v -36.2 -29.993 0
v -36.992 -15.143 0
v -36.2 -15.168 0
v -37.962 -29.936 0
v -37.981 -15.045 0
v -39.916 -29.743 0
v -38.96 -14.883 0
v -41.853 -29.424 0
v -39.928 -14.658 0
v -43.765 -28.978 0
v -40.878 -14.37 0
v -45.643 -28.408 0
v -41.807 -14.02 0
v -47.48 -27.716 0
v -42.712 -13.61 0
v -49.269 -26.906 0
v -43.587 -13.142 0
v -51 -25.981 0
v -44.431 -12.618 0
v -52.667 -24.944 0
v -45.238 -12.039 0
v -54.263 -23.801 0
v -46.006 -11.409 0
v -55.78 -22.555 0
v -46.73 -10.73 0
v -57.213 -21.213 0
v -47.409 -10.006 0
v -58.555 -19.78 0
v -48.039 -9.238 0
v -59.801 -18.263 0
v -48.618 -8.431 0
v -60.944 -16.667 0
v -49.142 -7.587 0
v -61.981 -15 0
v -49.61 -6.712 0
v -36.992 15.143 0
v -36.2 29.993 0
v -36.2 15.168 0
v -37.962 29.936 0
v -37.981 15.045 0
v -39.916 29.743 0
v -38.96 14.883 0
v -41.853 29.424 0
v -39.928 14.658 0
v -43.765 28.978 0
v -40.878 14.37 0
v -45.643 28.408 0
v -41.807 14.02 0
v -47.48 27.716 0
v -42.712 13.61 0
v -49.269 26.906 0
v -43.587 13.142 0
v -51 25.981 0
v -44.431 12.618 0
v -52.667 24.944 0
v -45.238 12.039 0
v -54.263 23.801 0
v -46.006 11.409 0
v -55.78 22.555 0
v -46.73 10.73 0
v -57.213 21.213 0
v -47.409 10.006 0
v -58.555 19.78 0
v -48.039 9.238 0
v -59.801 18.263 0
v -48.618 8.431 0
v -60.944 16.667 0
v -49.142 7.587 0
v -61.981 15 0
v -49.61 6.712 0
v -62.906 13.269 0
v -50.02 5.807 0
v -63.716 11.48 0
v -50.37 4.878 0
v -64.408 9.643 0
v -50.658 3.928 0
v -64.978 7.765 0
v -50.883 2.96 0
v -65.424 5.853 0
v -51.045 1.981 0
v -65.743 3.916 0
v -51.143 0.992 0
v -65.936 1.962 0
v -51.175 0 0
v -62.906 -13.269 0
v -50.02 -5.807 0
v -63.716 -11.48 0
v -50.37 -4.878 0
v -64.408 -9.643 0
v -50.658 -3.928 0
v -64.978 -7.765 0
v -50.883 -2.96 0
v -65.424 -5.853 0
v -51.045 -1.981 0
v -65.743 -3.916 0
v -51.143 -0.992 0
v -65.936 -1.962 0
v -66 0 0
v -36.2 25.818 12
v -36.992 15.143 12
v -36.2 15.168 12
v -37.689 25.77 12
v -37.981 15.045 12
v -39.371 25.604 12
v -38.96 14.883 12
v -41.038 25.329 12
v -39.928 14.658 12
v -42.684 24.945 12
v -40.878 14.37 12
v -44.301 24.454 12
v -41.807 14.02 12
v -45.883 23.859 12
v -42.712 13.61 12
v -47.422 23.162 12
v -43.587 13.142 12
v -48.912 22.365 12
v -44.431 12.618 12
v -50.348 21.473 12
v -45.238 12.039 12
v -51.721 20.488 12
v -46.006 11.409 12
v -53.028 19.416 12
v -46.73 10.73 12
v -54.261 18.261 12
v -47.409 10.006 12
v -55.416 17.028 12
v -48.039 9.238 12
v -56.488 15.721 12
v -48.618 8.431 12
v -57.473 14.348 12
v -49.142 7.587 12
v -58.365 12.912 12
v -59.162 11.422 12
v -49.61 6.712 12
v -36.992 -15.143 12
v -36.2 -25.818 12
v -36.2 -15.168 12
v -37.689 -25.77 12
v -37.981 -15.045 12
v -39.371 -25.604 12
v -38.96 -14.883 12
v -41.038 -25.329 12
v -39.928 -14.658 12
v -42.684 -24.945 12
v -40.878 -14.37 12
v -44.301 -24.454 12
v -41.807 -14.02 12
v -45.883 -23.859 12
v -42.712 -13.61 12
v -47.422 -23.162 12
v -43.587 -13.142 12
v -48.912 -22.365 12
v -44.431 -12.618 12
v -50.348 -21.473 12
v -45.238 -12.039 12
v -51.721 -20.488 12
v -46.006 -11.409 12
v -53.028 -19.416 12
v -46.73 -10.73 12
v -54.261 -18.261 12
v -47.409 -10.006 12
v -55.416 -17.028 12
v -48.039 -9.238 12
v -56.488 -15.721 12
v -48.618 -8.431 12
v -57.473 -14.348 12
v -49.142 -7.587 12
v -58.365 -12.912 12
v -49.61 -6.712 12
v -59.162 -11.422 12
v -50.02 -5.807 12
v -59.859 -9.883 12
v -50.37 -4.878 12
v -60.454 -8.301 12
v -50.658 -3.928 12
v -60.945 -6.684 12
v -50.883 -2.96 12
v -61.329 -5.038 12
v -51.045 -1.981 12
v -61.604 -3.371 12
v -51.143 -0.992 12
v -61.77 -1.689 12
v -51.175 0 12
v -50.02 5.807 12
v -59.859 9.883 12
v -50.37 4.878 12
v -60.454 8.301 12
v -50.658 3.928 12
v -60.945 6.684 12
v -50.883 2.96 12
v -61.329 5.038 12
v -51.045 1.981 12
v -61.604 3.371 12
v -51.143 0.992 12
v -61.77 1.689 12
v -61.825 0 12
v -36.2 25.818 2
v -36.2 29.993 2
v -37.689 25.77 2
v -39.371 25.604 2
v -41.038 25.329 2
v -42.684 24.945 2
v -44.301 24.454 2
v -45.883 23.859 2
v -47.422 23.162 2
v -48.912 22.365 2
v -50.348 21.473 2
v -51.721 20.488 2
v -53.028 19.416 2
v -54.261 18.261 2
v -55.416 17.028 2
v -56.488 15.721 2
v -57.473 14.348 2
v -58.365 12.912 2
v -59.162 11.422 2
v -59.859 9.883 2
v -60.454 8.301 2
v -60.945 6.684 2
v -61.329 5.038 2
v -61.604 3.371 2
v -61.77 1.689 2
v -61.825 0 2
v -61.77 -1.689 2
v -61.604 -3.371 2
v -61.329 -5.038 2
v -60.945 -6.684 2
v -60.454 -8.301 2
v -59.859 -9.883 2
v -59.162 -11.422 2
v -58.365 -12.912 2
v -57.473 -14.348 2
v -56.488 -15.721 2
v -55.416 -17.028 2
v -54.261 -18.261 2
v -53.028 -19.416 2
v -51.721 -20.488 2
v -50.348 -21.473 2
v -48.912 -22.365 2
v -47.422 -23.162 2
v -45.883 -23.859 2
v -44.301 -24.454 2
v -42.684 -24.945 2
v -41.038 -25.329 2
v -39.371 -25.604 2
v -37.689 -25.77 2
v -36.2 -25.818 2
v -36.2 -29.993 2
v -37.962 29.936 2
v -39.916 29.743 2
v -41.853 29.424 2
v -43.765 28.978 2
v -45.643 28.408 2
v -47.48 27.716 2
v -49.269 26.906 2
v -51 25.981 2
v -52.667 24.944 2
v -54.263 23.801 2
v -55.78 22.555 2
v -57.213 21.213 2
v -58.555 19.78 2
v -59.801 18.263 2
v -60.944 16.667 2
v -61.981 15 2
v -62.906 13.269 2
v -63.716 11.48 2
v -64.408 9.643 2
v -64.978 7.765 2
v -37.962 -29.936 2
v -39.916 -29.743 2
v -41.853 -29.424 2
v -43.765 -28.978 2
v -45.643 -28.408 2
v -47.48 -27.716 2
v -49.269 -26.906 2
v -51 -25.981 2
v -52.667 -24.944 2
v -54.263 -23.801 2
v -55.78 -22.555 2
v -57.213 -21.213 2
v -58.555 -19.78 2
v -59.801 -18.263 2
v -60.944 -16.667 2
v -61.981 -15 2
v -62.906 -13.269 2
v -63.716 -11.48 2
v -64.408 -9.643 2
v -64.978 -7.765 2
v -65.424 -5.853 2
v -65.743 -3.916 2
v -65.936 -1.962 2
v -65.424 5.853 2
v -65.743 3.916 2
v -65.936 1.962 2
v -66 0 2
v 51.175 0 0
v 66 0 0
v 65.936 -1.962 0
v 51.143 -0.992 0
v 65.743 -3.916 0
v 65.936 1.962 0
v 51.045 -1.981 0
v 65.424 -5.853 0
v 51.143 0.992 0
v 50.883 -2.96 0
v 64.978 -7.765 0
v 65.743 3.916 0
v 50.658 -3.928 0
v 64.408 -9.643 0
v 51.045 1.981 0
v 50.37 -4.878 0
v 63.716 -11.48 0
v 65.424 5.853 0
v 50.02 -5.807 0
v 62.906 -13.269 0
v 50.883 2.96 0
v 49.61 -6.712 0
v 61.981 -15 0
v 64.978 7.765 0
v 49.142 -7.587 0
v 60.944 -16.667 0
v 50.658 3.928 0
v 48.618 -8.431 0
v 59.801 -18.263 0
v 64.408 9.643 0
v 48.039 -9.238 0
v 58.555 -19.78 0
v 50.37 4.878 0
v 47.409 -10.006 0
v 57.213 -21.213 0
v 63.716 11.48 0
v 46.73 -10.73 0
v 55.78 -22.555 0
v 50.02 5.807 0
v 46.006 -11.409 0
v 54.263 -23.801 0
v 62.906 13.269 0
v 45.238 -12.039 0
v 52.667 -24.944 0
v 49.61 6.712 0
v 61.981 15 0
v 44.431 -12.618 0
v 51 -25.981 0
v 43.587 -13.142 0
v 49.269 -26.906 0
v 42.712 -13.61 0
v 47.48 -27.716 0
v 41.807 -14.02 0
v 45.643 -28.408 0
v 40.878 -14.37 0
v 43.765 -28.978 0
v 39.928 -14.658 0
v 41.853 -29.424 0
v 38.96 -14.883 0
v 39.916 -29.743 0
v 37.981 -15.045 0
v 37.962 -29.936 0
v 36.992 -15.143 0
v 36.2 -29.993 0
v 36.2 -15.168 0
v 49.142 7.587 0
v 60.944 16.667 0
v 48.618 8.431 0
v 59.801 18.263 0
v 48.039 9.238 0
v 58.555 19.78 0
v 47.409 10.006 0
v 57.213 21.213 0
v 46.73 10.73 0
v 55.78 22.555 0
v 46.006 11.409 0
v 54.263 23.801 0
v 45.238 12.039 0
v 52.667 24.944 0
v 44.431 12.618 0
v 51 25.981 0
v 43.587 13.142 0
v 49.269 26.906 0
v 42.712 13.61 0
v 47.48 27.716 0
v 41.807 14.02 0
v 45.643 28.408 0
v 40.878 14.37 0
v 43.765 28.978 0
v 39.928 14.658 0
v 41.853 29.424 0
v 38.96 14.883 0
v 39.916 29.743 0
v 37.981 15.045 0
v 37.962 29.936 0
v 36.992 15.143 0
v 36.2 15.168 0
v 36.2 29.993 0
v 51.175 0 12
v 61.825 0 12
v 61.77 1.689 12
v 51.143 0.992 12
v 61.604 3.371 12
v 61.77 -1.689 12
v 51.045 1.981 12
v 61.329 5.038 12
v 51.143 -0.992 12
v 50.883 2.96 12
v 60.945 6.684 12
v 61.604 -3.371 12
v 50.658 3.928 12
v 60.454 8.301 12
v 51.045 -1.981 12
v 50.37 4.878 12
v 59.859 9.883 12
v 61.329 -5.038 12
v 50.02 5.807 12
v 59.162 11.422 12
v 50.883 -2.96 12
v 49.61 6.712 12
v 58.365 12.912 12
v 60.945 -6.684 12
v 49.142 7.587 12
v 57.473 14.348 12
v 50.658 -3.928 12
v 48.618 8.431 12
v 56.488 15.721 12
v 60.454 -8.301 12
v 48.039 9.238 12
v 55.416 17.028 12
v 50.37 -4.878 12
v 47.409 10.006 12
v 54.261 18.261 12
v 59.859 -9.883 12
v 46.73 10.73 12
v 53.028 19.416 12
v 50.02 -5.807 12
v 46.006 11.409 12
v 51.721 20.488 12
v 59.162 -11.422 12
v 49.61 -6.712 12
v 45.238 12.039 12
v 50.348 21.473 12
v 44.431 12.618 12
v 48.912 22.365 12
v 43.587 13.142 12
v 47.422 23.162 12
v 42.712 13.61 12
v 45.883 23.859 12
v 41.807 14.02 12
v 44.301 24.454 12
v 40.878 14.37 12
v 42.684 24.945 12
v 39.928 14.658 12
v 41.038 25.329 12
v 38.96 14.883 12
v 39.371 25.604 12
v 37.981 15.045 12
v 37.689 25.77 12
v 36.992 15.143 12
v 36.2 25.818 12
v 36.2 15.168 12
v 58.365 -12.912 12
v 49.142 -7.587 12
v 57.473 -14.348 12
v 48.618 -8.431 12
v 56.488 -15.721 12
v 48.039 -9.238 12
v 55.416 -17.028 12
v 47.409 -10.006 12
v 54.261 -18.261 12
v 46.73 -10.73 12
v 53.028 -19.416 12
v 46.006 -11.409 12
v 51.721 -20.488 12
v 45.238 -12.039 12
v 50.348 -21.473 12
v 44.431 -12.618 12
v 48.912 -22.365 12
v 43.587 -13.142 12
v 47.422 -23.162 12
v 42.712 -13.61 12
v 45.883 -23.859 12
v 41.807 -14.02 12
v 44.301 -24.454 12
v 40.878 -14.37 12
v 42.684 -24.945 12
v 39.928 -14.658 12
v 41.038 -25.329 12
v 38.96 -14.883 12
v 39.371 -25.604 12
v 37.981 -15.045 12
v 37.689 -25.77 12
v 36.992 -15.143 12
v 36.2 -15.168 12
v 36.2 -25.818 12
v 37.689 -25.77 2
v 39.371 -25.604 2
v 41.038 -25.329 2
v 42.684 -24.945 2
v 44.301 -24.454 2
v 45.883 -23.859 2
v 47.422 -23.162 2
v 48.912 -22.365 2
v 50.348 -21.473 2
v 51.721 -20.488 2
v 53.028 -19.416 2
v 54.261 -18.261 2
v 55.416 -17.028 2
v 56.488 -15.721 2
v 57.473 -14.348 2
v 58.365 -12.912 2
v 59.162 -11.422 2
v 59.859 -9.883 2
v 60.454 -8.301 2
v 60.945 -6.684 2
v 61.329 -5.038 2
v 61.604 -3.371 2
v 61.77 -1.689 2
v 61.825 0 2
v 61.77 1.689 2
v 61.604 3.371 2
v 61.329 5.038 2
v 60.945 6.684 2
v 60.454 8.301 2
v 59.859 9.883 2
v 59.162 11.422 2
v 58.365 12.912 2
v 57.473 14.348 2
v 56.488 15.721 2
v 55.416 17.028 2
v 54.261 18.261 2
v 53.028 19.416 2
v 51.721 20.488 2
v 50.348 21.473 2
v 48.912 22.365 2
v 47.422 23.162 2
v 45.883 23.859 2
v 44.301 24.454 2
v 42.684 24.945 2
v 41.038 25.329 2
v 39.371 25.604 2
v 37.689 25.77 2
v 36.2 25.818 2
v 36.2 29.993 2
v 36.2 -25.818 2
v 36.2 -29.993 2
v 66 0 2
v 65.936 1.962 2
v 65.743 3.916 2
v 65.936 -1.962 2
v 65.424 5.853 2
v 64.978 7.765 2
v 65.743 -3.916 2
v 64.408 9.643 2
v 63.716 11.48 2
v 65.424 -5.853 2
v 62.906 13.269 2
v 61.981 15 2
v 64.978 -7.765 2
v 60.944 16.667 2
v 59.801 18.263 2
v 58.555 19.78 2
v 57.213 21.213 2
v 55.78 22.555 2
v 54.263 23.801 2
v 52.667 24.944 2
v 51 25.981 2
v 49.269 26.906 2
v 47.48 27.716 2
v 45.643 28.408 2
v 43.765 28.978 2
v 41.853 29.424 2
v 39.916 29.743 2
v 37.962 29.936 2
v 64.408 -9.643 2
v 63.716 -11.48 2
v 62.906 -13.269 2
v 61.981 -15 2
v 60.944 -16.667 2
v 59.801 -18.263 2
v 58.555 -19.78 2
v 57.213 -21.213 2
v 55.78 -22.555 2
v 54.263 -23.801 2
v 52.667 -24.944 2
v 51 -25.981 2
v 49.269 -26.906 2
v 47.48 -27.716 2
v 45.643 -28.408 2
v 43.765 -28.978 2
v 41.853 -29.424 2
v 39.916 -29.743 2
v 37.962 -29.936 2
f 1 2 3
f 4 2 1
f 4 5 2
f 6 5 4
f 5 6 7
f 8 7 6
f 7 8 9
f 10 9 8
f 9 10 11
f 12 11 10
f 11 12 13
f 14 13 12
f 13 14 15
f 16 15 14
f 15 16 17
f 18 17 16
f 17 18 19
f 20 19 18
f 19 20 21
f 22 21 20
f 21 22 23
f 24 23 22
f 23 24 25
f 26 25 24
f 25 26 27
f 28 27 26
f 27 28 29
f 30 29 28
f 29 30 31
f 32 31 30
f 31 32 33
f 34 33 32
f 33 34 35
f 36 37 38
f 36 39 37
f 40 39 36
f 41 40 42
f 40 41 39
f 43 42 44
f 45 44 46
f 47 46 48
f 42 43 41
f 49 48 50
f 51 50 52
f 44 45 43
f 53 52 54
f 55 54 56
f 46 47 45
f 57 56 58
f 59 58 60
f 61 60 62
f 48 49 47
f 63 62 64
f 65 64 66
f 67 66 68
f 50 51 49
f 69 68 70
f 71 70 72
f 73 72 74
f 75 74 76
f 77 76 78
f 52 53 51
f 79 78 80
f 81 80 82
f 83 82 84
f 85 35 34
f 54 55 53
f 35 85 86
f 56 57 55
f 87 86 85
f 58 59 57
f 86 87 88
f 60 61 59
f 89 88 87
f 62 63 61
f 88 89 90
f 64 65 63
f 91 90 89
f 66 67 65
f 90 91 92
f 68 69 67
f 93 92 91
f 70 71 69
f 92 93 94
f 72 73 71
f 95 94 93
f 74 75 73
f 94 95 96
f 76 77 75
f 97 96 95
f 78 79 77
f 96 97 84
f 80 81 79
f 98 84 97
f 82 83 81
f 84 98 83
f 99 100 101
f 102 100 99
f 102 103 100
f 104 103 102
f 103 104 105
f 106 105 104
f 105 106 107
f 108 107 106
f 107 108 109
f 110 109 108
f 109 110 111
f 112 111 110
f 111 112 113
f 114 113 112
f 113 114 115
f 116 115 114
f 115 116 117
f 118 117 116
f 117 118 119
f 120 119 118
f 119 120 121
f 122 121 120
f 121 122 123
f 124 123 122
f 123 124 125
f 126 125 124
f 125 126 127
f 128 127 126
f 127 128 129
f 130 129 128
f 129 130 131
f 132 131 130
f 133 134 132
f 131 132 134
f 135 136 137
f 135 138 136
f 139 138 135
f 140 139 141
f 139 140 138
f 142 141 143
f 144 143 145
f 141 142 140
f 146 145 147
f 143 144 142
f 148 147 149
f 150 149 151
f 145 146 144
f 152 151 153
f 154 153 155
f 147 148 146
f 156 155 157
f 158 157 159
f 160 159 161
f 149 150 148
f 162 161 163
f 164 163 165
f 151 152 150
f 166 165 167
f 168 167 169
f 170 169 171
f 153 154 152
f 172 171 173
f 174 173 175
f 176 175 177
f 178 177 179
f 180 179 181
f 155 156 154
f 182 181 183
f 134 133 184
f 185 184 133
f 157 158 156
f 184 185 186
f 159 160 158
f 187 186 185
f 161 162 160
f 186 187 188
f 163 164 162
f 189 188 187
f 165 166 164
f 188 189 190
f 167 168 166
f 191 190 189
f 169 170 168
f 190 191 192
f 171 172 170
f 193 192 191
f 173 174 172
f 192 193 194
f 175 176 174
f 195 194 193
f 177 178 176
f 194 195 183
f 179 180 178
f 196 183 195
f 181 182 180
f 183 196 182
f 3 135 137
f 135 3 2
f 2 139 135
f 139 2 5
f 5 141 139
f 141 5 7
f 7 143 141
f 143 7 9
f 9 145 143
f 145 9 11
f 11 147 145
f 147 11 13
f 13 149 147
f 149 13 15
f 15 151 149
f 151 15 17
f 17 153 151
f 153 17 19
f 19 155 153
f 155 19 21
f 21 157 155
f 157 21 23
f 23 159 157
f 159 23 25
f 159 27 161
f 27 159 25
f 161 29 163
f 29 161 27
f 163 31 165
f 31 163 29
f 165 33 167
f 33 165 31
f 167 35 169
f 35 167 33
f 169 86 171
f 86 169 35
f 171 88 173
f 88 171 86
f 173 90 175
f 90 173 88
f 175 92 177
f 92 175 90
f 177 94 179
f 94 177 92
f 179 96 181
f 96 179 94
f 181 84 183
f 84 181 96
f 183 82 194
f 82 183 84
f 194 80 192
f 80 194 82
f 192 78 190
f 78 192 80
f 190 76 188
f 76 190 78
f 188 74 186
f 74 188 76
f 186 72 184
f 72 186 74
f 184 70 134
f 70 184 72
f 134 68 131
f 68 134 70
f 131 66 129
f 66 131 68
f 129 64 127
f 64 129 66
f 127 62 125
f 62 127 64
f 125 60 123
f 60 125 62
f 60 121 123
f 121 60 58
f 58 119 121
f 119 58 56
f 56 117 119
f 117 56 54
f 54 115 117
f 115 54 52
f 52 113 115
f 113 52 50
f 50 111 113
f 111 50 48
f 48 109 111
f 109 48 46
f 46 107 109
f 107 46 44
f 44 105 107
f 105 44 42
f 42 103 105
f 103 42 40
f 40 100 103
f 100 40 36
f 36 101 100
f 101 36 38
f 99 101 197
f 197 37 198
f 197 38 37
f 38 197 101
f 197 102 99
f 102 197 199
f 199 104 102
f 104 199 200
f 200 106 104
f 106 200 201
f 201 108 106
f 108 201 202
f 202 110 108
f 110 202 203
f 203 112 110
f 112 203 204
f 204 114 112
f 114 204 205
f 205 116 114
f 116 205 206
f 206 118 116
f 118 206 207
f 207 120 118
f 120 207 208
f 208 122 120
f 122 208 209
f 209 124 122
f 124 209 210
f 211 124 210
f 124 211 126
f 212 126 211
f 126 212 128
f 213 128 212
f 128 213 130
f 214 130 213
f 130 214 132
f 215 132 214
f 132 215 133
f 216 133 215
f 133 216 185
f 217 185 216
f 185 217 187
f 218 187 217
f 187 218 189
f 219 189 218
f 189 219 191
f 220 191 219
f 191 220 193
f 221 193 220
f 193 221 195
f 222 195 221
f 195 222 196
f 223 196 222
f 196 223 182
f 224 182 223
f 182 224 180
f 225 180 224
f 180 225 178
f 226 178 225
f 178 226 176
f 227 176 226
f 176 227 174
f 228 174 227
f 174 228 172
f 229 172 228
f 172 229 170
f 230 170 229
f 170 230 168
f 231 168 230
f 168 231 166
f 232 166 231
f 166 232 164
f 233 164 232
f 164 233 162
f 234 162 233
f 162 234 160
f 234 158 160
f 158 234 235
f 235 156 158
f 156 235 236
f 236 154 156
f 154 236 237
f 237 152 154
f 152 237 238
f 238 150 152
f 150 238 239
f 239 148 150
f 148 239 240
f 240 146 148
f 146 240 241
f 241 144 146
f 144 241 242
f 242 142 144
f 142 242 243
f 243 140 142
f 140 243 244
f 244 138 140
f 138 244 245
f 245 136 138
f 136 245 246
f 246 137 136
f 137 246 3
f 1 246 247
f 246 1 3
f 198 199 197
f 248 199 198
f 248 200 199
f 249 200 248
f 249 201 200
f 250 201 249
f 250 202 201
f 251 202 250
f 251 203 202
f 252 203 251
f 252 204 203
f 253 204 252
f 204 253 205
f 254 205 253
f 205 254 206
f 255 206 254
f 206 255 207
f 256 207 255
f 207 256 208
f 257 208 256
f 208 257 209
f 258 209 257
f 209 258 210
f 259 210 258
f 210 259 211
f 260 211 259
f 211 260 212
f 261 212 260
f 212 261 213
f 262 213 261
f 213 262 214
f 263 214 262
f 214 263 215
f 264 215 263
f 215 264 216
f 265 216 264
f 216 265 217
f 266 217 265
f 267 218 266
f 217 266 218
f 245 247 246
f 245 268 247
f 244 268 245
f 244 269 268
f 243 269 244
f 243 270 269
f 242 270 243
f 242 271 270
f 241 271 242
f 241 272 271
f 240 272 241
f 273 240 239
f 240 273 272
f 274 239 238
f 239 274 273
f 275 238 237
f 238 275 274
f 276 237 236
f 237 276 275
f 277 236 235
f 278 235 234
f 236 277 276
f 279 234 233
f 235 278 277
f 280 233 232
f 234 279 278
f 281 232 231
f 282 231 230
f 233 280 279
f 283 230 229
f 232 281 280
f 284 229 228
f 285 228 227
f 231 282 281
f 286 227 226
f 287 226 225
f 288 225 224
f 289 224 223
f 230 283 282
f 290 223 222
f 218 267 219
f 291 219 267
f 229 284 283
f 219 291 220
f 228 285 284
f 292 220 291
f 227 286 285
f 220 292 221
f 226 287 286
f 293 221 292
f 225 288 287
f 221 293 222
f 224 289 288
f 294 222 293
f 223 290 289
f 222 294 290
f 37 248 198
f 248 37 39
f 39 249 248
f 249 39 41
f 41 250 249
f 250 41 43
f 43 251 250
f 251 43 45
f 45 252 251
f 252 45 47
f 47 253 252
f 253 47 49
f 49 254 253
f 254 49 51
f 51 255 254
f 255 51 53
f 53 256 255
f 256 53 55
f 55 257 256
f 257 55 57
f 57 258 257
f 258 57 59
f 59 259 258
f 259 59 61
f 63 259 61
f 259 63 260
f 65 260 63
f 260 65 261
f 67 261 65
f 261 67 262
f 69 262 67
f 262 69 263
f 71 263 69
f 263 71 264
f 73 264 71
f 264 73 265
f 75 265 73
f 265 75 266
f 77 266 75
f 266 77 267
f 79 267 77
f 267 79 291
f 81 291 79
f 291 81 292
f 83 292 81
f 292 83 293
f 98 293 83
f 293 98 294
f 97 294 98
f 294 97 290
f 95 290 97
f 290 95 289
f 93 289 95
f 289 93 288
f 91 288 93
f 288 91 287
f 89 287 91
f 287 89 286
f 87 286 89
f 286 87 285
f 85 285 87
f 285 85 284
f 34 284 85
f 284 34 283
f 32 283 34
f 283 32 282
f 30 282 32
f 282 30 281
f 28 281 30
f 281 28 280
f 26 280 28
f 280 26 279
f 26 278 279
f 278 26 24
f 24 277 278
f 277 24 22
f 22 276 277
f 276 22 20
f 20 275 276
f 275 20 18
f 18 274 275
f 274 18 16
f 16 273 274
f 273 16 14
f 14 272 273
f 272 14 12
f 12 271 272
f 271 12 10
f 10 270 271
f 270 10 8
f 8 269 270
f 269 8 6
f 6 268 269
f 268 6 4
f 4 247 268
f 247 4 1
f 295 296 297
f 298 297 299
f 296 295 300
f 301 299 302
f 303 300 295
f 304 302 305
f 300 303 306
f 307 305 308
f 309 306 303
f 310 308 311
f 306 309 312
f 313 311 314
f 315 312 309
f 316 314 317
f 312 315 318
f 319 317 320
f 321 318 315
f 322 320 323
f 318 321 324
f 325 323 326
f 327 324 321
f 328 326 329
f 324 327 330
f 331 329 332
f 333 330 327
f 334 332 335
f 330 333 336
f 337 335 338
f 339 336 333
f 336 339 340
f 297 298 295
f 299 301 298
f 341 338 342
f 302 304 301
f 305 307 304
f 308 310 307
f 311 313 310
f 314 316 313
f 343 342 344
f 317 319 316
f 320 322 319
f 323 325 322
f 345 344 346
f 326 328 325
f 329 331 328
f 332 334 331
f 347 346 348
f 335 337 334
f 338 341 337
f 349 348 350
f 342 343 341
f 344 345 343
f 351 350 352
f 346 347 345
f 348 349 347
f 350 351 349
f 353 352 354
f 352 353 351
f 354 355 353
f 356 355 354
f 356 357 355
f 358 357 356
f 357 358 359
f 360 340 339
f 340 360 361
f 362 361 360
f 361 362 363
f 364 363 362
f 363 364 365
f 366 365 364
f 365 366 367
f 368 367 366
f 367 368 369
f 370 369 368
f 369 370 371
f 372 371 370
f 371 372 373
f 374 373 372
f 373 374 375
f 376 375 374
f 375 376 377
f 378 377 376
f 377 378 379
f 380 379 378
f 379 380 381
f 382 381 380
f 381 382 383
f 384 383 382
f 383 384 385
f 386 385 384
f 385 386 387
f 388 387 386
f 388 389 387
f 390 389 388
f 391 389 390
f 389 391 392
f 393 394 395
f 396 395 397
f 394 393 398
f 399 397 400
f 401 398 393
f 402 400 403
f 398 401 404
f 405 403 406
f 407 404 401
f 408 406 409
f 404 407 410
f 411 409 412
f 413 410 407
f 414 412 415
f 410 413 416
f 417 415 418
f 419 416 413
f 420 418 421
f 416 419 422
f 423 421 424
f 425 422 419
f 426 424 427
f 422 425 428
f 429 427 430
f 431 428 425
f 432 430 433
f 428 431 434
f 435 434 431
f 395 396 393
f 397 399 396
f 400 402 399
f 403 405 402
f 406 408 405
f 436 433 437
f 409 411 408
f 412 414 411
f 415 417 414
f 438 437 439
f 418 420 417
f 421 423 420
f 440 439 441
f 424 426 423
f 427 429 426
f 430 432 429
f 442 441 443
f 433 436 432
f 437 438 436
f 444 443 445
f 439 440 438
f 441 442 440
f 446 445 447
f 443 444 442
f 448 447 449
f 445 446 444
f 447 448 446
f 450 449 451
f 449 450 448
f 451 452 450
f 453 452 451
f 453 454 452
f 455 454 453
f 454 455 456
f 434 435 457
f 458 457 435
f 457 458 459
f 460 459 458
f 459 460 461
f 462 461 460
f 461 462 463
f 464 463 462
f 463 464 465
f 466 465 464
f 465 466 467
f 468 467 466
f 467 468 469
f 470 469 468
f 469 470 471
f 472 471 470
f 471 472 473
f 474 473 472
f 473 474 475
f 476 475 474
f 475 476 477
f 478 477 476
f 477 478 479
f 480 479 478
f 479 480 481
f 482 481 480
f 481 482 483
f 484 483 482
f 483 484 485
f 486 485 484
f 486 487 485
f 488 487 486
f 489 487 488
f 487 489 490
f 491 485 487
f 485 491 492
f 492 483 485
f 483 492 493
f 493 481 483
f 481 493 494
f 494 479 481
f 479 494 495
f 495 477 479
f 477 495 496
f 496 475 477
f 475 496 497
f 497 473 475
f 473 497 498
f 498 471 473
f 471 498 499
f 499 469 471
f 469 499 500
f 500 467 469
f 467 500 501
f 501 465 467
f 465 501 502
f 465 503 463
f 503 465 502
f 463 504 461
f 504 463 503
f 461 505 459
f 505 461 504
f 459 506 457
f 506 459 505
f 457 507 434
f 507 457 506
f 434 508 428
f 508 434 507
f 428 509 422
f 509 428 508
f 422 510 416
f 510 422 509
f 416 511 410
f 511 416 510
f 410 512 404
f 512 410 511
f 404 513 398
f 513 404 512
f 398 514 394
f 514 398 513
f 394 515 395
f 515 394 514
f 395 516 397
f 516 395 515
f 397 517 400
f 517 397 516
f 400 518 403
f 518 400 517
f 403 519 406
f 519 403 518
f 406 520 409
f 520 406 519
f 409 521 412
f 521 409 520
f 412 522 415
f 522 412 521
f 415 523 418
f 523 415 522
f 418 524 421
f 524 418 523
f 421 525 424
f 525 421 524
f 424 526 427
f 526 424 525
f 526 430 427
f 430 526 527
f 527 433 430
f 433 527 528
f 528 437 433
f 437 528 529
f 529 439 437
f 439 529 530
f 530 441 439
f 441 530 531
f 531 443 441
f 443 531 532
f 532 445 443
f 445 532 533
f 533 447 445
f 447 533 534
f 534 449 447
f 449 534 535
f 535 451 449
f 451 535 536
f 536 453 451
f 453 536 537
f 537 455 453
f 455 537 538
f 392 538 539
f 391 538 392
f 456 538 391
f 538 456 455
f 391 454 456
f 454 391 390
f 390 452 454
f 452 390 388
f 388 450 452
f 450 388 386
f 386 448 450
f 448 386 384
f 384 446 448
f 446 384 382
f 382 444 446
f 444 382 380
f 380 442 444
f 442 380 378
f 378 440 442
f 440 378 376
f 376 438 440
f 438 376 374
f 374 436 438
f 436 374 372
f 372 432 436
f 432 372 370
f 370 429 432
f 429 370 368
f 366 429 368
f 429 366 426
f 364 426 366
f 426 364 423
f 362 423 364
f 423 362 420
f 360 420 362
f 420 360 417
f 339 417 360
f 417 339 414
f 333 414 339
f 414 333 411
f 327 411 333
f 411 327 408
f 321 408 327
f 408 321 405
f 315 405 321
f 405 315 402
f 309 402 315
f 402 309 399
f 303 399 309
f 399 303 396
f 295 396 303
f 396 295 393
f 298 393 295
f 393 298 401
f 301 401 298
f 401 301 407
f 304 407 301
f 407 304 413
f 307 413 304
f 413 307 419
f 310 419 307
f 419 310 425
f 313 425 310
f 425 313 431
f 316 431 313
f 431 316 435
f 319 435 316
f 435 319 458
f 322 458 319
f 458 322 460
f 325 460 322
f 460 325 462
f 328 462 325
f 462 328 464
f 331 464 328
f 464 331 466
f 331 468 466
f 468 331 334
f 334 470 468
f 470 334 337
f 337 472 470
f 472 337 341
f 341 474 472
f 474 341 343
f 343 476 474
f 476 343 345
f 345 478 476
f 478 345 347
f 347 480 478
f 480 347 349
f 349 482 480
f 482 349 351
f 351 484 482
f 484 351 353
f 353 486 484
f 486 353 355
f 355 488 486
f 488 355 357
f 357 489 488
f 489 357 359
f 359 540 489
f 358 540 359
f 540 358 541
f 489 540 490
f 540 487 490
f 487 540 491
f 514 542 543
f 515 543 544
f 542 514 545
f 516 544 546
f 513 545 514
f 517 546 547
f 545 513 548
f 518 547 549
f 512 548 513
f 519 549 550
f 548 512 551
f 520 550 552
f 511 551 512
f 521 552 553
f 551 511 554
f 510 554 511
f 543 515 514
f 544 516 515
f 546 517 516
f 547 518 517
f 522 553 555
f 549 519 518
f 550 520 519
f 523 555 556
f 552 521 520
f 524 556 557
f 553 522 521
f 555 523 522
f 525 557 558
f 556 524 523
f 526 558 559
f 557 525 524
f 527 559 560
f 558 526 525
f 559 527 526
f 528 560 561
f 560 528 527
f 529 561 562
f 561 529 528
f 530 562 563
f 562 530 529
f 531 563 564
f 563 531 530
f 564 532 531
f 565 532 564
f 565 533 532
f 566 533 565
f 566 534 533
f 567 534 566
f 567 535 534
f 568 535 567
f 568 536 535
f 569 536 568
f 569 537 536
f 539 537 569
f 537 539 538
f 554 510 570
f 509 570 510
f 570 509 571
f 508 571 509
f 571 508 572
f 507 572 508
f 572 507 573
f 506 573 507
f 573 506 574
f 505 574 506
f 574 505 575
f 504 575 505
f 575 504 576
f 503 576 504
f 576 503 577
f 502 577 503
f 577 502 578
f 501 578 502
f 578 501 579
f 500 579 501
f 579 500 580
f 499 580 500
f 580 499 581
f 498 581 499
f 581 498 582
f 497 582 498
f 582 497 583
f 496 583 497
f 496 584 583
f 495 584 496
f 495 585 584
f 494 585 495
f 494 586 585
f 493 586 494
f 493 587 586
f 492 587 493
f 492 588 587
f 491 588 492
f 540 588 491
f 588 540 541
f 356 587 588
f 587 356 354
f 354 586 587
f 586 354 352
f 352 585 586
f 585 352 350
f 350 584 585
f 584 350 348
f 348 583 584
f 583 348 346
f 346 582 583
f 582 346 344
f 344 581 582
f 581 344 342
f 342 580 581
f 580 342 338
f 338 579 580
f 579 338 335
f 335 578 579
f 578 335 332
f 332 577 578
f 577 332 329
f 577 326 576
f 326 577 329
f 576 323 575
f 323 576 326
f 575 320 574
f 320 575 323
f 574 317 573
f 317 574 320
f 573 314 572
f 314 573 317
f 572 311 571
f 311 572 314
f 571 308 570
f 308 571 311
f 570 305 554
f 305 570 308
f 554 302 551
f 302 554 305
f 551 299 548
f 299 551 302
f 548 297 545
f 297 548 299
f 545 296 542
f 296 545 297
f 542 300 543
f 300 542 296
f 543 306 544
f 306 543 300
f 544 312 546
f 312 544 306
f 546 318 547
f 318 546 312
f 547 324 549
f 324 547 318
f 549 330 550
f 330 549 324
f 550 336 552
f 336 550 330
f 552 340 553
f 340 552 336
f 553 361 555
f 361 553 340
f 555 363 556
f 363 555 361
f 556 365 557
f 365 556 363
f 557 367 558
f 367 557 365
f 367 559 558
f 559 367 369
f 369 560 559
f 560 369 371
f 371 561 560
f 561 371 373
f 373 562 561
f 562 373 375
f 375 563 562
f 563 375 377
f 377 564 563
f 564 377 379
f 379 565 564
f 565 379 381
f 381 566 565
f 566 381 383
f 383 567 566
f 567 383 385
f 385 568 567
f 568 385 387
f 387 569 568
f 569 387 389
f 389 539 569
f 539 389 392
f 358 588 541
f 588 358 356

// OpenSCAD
// Parametric two-piece filament spool adapter.
// Dimensions are in millimeters.
//
// Default values match the existing CR-6 STL intent:
// - 30 mm printer shaft
// - 52 mm spool bore
// - 60 mm keeper/flange supported against the spool side
//
// Render both printable halves side-by-side, then put the halves together
// around the shaft to adapt the shaft diameter up to the spool bore.

$fn = 96;

shaft_diameter = 30;
spool_bore_diameter = 52;
keeper_outer_diameter = 60;

adapter_width = 12;        // Total axial width of each half.
keeper_width = 2;          // Axial thickness of the side keeper/flange.
clearance = 0.35;          // Added to the shaft bore and removed from the spool fit.
split_gap = 0.4;           // Clearance between the two assembled half faces.
print_gap = 12;            // Gap between the two halves in the rendered layout.

// Small flat pads at the split line help the halves sit cleanly together and
// make the geometry more robust when printed.
split_flat_width = 1.2;

module half_annulus_2d(outer_diameter, inner_diameter, side = 1) {
    radius = outer_diameter / 2;

    difference() {
        intersection() {
            circle(d = outer_diameter);

            // Keep only one side of the circular adapter.  The extra overlap
            // avoids coincident edges at the split line.
            translate([
                side > 0 ? split_gap / 2 : -radius - 1,
                -radius - 1
            ])
                square([radius + 1 - split_gap / 2, outer_diameter + 2]);
        }

        circle(d = inner_diameter);

        // Trim a narrow strip from the split face so the two halves do not bind
        // when they are clamped around the shaft.
        translate([
            side > 0 ? -split_flat_width : -split_gap / 2,
            -radius - 1
        ])
            square([split_flat_width + split_gap / 2, outer_diameter + 2]);
    }
}

module adapter_half(side = 1) {
    shaft_bore = shaft_diameter + clearance;
    spool_fit = spool_bore_diameter - clearance;

    union() {
        // Main body that fits into the spool bore.
        linear_extrude(height = adapter_width)
            half_annulus_2d(spool_fit, shaft_bore, side);

        // Larger side keeper/flange.  This is intentionally only on one side
        // so it bears on the side of the spool instead of widening the whole
        // adapter.
        linear_extrude(height = keeper_width)
            half_annulus_2d(keeper_outer_diameter, shaft_bore, side);
    }
}

module printable_pair() {
    part_offset = keeper_outer_diameter / 2 + print_gap / 2;

    translate([-part_offset, 0, 0])
        adapter_half(side = -1);

    translate([part_offset, 0, 0])
        adapter_half(side = 1);
}

printable_pair();
